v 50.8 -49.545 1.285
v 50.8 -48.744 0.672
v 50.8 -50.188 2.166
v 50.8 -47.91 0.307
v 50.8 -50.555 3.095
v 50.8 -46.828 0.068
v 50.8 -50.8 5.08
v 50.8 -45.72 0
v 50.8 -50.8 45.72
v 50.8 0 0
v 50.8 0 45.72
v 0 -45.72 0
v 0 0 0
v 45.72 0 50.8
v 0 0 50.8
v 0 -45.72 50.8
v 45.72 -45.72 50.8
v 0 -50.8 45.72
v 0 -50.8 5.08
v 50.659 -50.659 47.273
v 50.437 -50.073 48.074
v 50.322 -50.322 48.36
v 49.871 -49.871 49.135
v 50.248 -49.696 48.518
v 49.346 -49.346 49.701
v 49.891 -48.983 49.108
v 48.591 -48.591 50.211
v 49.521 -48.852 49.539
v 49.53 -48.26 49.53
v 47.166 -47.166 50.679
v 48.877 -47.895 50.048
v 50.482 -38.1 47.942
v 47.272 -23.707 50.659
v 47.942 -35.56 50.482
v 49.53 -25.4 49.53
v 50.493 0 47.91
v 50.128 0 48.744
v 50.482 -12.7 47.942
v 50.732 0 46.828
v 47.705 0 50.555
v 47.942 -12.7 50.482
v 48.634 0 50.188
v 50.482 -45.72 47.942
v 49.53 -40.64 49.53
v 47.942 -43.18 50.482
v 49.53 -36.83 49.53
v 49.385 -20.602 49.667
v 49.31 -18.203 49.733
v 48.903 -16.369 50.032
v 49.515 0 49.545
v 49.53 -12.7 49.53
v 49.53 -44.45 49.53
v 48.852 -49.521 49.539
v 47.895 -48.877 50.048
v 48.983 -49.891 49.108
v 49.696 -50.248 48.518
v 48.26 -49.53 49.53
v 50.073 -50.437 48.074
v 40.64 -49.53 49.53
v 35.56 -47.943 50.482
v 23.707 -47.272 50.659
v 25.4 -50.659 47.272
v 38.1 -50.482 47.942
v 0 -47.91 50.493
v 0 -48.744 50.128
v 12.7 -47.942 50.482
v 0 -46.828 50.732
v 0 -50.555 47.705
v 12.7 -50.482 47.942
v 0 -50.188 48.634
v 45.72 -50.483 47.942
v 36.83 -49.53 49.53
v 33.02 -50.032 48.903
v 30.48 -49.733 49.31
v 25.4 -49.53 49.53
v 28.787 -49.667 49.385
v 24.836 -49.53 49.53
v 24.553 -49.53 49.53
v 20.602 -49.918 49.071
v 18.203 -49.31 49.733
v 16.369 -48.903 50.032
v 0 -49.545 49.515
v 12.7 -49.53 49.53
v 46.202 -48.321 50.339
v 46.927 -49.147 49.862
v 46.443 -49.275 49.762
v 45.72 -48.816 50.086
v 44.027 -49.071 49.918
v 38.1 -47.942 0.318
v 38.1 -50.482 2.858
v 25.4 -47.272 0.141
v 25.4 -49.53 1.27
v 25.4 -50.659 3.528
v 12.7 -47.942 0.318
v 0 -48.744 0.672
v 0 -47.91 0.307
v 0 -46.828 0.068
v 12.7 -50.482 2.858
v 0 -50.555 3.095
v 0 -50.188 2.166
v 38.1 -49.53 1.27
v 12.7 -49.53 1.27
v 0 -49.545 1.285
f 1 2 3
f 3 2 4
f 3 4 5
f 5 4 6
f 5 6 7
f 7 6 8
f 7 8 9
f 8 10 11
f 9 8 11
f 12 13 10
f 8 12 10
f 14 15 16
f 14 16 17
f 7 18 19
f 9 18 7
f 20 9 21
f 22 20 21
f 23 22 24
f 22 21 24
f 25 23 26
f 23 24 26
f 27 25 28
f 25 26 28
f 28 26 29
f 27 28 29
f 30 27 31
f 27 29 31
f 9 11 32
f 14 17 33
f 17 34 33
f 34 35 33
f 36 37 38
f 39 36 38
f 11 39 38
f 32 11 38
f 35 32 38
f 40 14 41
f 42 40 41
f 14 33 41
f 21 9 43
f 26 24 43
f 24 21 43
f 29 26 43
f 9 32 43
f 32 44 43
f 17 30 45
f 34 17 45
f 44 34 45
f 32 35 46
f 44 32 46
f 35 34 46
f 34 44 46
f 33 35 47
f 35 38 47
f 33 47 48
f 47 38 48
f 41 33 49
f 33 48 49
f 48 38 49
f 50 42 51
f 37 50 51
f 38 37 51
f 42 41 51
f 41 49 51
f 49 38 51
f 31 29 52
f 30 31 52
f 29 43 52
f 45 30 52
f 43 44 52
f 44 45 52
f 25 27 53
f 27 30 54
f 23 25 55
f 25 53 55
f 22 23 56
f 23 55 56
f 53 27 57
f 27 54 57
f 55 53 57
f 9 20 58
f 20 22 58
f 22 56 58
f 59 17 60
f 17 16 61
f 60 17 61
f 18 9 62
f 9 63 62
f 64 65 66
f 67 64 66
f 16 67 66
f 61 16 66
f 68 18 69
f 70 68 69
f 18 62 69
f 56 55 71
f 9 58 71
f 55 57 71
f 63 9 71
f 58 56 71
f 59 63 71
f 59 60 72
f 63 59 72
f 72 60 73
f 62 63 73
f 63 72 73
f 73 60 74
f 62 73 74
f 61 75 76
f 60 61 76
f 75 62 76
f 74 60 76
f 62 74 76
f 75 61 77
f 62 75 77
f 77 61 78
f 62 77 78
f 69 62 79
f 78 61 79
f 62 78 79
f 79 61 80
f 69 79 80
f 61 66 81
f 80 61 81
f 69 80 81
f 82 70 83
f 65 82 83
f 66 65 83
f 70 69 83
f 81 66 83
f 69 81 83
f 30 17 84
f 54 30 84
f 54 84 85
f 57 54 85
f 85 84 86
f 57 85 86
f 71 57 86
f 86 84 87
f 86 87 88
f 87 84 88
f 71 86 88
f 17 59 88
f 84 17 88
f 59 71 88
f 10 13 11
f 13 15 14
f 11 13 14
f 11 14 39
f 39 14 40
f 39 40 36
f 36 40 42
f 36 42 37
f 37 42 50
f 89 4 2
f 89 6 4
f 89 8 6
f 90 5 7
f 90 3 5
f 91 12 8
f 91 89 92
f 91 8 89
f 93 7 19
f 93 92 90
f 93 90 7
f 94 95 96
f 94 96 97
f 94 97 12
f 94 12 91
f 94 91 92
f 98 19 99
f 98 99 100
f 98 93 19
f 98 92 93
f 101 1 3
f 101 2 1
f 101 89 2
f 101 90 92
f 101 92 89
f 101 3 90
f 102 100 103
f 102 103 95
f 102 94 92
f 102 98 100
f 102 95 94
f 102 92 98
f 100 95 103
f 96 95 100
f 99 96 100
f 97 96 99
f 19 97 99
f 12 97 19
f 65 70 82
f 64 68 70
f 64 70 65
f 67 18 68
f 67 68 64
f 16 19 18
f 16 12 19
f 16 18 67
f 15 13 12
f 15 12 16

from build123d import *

# Parameters (mm, degrees)
F0_W        = 50.8
F0_H        = 50.8
F1_DEPTH    = 50.8
F2_T1_DEPTH = 76.2
F2_T3_DEPTH = 76.2
F3_T1_DEPTH = 76.2


# Not quite as in the source:
# - a fillet or chamfer that OpenCascade refuses, or shapes differently, is made with other operations: its cross-section is extruded or revolved along the edge and cut away or added


with BuildPart() as f1:
    # F0 (on Front) → F1 (new body)
    with BuildSketch(Plane.XZ):
        with Locations((25.4, 25.4)):
            Rectangle(F0_W, F0_H)
    extrude(amount=F1_DEPTH)

    # F2: fillet of radius 5.08 on 2 edges, made by hand

    # F2_s2 → F2_t1 (cut)
    with BuildSketch(Plane.XZ.offset(-12.7)):
        with BuildLine():
            add(Edge.make_bspline(
                [(50.8, 45.72), (50.8, 50.8), (45.72, 50.8)],
                knots=[0, 0, 0, 1, 1, 1], degree=2, weights=[1, 1, 1]))
            Line((45.72, 50.8), (50.8, 50.8))
            Line((50.8, 50.8), (50.8, 45.72))
        make_face()
    extrude(amount=F2_T1_DEPTH, mode=Mode.SUBTRACT)

    # F2_s4 → F2_t3 (cut)
    with BuildSketch(Plane.YZ.offset(-12.7)):
        with BuildLine():
            add(Edge.make_bspline(
                [(-45.72, 50.8), (-50.8, 50.8), (-50.8, 45.72)],
                knots=[0, 0, 0, 1, 1, 1], degree=2, weights=[1, 1, 1]))
            Line((-50.8, 45.72), (-50.8, 50.8))
            Line((-50.8, 50.8), (-45.72, 50.8))
        make_face()
    extrude(amount=F2_T3_DEPTH, mode=Mode.SUBTRACT)

    # F3: fillet of radius 5.08 on 1 edges, made by hand

    # F3_s2 → F3_t1 (cut)
    with BuildSketch(Plane.YZ.offset(-12.7)):
        with BuildLine():
            add(Edge.make_bspline(
                [(-45.72, 0), (-50.8, 0), (-50.8, 5.08)],
                knots=[0, 0, 0, 1, 1, 1], degree=2, weights=[1, 1, 1]))
            Line((-50.8, 5.08), (-50.8, 0))
            Line((-50.8, 0), (-45.72, 0))
        make_face()
    extrude(amount=F3_T1_DEPTH, mode=Mode.SUBTRACT)


solid = f1.part
